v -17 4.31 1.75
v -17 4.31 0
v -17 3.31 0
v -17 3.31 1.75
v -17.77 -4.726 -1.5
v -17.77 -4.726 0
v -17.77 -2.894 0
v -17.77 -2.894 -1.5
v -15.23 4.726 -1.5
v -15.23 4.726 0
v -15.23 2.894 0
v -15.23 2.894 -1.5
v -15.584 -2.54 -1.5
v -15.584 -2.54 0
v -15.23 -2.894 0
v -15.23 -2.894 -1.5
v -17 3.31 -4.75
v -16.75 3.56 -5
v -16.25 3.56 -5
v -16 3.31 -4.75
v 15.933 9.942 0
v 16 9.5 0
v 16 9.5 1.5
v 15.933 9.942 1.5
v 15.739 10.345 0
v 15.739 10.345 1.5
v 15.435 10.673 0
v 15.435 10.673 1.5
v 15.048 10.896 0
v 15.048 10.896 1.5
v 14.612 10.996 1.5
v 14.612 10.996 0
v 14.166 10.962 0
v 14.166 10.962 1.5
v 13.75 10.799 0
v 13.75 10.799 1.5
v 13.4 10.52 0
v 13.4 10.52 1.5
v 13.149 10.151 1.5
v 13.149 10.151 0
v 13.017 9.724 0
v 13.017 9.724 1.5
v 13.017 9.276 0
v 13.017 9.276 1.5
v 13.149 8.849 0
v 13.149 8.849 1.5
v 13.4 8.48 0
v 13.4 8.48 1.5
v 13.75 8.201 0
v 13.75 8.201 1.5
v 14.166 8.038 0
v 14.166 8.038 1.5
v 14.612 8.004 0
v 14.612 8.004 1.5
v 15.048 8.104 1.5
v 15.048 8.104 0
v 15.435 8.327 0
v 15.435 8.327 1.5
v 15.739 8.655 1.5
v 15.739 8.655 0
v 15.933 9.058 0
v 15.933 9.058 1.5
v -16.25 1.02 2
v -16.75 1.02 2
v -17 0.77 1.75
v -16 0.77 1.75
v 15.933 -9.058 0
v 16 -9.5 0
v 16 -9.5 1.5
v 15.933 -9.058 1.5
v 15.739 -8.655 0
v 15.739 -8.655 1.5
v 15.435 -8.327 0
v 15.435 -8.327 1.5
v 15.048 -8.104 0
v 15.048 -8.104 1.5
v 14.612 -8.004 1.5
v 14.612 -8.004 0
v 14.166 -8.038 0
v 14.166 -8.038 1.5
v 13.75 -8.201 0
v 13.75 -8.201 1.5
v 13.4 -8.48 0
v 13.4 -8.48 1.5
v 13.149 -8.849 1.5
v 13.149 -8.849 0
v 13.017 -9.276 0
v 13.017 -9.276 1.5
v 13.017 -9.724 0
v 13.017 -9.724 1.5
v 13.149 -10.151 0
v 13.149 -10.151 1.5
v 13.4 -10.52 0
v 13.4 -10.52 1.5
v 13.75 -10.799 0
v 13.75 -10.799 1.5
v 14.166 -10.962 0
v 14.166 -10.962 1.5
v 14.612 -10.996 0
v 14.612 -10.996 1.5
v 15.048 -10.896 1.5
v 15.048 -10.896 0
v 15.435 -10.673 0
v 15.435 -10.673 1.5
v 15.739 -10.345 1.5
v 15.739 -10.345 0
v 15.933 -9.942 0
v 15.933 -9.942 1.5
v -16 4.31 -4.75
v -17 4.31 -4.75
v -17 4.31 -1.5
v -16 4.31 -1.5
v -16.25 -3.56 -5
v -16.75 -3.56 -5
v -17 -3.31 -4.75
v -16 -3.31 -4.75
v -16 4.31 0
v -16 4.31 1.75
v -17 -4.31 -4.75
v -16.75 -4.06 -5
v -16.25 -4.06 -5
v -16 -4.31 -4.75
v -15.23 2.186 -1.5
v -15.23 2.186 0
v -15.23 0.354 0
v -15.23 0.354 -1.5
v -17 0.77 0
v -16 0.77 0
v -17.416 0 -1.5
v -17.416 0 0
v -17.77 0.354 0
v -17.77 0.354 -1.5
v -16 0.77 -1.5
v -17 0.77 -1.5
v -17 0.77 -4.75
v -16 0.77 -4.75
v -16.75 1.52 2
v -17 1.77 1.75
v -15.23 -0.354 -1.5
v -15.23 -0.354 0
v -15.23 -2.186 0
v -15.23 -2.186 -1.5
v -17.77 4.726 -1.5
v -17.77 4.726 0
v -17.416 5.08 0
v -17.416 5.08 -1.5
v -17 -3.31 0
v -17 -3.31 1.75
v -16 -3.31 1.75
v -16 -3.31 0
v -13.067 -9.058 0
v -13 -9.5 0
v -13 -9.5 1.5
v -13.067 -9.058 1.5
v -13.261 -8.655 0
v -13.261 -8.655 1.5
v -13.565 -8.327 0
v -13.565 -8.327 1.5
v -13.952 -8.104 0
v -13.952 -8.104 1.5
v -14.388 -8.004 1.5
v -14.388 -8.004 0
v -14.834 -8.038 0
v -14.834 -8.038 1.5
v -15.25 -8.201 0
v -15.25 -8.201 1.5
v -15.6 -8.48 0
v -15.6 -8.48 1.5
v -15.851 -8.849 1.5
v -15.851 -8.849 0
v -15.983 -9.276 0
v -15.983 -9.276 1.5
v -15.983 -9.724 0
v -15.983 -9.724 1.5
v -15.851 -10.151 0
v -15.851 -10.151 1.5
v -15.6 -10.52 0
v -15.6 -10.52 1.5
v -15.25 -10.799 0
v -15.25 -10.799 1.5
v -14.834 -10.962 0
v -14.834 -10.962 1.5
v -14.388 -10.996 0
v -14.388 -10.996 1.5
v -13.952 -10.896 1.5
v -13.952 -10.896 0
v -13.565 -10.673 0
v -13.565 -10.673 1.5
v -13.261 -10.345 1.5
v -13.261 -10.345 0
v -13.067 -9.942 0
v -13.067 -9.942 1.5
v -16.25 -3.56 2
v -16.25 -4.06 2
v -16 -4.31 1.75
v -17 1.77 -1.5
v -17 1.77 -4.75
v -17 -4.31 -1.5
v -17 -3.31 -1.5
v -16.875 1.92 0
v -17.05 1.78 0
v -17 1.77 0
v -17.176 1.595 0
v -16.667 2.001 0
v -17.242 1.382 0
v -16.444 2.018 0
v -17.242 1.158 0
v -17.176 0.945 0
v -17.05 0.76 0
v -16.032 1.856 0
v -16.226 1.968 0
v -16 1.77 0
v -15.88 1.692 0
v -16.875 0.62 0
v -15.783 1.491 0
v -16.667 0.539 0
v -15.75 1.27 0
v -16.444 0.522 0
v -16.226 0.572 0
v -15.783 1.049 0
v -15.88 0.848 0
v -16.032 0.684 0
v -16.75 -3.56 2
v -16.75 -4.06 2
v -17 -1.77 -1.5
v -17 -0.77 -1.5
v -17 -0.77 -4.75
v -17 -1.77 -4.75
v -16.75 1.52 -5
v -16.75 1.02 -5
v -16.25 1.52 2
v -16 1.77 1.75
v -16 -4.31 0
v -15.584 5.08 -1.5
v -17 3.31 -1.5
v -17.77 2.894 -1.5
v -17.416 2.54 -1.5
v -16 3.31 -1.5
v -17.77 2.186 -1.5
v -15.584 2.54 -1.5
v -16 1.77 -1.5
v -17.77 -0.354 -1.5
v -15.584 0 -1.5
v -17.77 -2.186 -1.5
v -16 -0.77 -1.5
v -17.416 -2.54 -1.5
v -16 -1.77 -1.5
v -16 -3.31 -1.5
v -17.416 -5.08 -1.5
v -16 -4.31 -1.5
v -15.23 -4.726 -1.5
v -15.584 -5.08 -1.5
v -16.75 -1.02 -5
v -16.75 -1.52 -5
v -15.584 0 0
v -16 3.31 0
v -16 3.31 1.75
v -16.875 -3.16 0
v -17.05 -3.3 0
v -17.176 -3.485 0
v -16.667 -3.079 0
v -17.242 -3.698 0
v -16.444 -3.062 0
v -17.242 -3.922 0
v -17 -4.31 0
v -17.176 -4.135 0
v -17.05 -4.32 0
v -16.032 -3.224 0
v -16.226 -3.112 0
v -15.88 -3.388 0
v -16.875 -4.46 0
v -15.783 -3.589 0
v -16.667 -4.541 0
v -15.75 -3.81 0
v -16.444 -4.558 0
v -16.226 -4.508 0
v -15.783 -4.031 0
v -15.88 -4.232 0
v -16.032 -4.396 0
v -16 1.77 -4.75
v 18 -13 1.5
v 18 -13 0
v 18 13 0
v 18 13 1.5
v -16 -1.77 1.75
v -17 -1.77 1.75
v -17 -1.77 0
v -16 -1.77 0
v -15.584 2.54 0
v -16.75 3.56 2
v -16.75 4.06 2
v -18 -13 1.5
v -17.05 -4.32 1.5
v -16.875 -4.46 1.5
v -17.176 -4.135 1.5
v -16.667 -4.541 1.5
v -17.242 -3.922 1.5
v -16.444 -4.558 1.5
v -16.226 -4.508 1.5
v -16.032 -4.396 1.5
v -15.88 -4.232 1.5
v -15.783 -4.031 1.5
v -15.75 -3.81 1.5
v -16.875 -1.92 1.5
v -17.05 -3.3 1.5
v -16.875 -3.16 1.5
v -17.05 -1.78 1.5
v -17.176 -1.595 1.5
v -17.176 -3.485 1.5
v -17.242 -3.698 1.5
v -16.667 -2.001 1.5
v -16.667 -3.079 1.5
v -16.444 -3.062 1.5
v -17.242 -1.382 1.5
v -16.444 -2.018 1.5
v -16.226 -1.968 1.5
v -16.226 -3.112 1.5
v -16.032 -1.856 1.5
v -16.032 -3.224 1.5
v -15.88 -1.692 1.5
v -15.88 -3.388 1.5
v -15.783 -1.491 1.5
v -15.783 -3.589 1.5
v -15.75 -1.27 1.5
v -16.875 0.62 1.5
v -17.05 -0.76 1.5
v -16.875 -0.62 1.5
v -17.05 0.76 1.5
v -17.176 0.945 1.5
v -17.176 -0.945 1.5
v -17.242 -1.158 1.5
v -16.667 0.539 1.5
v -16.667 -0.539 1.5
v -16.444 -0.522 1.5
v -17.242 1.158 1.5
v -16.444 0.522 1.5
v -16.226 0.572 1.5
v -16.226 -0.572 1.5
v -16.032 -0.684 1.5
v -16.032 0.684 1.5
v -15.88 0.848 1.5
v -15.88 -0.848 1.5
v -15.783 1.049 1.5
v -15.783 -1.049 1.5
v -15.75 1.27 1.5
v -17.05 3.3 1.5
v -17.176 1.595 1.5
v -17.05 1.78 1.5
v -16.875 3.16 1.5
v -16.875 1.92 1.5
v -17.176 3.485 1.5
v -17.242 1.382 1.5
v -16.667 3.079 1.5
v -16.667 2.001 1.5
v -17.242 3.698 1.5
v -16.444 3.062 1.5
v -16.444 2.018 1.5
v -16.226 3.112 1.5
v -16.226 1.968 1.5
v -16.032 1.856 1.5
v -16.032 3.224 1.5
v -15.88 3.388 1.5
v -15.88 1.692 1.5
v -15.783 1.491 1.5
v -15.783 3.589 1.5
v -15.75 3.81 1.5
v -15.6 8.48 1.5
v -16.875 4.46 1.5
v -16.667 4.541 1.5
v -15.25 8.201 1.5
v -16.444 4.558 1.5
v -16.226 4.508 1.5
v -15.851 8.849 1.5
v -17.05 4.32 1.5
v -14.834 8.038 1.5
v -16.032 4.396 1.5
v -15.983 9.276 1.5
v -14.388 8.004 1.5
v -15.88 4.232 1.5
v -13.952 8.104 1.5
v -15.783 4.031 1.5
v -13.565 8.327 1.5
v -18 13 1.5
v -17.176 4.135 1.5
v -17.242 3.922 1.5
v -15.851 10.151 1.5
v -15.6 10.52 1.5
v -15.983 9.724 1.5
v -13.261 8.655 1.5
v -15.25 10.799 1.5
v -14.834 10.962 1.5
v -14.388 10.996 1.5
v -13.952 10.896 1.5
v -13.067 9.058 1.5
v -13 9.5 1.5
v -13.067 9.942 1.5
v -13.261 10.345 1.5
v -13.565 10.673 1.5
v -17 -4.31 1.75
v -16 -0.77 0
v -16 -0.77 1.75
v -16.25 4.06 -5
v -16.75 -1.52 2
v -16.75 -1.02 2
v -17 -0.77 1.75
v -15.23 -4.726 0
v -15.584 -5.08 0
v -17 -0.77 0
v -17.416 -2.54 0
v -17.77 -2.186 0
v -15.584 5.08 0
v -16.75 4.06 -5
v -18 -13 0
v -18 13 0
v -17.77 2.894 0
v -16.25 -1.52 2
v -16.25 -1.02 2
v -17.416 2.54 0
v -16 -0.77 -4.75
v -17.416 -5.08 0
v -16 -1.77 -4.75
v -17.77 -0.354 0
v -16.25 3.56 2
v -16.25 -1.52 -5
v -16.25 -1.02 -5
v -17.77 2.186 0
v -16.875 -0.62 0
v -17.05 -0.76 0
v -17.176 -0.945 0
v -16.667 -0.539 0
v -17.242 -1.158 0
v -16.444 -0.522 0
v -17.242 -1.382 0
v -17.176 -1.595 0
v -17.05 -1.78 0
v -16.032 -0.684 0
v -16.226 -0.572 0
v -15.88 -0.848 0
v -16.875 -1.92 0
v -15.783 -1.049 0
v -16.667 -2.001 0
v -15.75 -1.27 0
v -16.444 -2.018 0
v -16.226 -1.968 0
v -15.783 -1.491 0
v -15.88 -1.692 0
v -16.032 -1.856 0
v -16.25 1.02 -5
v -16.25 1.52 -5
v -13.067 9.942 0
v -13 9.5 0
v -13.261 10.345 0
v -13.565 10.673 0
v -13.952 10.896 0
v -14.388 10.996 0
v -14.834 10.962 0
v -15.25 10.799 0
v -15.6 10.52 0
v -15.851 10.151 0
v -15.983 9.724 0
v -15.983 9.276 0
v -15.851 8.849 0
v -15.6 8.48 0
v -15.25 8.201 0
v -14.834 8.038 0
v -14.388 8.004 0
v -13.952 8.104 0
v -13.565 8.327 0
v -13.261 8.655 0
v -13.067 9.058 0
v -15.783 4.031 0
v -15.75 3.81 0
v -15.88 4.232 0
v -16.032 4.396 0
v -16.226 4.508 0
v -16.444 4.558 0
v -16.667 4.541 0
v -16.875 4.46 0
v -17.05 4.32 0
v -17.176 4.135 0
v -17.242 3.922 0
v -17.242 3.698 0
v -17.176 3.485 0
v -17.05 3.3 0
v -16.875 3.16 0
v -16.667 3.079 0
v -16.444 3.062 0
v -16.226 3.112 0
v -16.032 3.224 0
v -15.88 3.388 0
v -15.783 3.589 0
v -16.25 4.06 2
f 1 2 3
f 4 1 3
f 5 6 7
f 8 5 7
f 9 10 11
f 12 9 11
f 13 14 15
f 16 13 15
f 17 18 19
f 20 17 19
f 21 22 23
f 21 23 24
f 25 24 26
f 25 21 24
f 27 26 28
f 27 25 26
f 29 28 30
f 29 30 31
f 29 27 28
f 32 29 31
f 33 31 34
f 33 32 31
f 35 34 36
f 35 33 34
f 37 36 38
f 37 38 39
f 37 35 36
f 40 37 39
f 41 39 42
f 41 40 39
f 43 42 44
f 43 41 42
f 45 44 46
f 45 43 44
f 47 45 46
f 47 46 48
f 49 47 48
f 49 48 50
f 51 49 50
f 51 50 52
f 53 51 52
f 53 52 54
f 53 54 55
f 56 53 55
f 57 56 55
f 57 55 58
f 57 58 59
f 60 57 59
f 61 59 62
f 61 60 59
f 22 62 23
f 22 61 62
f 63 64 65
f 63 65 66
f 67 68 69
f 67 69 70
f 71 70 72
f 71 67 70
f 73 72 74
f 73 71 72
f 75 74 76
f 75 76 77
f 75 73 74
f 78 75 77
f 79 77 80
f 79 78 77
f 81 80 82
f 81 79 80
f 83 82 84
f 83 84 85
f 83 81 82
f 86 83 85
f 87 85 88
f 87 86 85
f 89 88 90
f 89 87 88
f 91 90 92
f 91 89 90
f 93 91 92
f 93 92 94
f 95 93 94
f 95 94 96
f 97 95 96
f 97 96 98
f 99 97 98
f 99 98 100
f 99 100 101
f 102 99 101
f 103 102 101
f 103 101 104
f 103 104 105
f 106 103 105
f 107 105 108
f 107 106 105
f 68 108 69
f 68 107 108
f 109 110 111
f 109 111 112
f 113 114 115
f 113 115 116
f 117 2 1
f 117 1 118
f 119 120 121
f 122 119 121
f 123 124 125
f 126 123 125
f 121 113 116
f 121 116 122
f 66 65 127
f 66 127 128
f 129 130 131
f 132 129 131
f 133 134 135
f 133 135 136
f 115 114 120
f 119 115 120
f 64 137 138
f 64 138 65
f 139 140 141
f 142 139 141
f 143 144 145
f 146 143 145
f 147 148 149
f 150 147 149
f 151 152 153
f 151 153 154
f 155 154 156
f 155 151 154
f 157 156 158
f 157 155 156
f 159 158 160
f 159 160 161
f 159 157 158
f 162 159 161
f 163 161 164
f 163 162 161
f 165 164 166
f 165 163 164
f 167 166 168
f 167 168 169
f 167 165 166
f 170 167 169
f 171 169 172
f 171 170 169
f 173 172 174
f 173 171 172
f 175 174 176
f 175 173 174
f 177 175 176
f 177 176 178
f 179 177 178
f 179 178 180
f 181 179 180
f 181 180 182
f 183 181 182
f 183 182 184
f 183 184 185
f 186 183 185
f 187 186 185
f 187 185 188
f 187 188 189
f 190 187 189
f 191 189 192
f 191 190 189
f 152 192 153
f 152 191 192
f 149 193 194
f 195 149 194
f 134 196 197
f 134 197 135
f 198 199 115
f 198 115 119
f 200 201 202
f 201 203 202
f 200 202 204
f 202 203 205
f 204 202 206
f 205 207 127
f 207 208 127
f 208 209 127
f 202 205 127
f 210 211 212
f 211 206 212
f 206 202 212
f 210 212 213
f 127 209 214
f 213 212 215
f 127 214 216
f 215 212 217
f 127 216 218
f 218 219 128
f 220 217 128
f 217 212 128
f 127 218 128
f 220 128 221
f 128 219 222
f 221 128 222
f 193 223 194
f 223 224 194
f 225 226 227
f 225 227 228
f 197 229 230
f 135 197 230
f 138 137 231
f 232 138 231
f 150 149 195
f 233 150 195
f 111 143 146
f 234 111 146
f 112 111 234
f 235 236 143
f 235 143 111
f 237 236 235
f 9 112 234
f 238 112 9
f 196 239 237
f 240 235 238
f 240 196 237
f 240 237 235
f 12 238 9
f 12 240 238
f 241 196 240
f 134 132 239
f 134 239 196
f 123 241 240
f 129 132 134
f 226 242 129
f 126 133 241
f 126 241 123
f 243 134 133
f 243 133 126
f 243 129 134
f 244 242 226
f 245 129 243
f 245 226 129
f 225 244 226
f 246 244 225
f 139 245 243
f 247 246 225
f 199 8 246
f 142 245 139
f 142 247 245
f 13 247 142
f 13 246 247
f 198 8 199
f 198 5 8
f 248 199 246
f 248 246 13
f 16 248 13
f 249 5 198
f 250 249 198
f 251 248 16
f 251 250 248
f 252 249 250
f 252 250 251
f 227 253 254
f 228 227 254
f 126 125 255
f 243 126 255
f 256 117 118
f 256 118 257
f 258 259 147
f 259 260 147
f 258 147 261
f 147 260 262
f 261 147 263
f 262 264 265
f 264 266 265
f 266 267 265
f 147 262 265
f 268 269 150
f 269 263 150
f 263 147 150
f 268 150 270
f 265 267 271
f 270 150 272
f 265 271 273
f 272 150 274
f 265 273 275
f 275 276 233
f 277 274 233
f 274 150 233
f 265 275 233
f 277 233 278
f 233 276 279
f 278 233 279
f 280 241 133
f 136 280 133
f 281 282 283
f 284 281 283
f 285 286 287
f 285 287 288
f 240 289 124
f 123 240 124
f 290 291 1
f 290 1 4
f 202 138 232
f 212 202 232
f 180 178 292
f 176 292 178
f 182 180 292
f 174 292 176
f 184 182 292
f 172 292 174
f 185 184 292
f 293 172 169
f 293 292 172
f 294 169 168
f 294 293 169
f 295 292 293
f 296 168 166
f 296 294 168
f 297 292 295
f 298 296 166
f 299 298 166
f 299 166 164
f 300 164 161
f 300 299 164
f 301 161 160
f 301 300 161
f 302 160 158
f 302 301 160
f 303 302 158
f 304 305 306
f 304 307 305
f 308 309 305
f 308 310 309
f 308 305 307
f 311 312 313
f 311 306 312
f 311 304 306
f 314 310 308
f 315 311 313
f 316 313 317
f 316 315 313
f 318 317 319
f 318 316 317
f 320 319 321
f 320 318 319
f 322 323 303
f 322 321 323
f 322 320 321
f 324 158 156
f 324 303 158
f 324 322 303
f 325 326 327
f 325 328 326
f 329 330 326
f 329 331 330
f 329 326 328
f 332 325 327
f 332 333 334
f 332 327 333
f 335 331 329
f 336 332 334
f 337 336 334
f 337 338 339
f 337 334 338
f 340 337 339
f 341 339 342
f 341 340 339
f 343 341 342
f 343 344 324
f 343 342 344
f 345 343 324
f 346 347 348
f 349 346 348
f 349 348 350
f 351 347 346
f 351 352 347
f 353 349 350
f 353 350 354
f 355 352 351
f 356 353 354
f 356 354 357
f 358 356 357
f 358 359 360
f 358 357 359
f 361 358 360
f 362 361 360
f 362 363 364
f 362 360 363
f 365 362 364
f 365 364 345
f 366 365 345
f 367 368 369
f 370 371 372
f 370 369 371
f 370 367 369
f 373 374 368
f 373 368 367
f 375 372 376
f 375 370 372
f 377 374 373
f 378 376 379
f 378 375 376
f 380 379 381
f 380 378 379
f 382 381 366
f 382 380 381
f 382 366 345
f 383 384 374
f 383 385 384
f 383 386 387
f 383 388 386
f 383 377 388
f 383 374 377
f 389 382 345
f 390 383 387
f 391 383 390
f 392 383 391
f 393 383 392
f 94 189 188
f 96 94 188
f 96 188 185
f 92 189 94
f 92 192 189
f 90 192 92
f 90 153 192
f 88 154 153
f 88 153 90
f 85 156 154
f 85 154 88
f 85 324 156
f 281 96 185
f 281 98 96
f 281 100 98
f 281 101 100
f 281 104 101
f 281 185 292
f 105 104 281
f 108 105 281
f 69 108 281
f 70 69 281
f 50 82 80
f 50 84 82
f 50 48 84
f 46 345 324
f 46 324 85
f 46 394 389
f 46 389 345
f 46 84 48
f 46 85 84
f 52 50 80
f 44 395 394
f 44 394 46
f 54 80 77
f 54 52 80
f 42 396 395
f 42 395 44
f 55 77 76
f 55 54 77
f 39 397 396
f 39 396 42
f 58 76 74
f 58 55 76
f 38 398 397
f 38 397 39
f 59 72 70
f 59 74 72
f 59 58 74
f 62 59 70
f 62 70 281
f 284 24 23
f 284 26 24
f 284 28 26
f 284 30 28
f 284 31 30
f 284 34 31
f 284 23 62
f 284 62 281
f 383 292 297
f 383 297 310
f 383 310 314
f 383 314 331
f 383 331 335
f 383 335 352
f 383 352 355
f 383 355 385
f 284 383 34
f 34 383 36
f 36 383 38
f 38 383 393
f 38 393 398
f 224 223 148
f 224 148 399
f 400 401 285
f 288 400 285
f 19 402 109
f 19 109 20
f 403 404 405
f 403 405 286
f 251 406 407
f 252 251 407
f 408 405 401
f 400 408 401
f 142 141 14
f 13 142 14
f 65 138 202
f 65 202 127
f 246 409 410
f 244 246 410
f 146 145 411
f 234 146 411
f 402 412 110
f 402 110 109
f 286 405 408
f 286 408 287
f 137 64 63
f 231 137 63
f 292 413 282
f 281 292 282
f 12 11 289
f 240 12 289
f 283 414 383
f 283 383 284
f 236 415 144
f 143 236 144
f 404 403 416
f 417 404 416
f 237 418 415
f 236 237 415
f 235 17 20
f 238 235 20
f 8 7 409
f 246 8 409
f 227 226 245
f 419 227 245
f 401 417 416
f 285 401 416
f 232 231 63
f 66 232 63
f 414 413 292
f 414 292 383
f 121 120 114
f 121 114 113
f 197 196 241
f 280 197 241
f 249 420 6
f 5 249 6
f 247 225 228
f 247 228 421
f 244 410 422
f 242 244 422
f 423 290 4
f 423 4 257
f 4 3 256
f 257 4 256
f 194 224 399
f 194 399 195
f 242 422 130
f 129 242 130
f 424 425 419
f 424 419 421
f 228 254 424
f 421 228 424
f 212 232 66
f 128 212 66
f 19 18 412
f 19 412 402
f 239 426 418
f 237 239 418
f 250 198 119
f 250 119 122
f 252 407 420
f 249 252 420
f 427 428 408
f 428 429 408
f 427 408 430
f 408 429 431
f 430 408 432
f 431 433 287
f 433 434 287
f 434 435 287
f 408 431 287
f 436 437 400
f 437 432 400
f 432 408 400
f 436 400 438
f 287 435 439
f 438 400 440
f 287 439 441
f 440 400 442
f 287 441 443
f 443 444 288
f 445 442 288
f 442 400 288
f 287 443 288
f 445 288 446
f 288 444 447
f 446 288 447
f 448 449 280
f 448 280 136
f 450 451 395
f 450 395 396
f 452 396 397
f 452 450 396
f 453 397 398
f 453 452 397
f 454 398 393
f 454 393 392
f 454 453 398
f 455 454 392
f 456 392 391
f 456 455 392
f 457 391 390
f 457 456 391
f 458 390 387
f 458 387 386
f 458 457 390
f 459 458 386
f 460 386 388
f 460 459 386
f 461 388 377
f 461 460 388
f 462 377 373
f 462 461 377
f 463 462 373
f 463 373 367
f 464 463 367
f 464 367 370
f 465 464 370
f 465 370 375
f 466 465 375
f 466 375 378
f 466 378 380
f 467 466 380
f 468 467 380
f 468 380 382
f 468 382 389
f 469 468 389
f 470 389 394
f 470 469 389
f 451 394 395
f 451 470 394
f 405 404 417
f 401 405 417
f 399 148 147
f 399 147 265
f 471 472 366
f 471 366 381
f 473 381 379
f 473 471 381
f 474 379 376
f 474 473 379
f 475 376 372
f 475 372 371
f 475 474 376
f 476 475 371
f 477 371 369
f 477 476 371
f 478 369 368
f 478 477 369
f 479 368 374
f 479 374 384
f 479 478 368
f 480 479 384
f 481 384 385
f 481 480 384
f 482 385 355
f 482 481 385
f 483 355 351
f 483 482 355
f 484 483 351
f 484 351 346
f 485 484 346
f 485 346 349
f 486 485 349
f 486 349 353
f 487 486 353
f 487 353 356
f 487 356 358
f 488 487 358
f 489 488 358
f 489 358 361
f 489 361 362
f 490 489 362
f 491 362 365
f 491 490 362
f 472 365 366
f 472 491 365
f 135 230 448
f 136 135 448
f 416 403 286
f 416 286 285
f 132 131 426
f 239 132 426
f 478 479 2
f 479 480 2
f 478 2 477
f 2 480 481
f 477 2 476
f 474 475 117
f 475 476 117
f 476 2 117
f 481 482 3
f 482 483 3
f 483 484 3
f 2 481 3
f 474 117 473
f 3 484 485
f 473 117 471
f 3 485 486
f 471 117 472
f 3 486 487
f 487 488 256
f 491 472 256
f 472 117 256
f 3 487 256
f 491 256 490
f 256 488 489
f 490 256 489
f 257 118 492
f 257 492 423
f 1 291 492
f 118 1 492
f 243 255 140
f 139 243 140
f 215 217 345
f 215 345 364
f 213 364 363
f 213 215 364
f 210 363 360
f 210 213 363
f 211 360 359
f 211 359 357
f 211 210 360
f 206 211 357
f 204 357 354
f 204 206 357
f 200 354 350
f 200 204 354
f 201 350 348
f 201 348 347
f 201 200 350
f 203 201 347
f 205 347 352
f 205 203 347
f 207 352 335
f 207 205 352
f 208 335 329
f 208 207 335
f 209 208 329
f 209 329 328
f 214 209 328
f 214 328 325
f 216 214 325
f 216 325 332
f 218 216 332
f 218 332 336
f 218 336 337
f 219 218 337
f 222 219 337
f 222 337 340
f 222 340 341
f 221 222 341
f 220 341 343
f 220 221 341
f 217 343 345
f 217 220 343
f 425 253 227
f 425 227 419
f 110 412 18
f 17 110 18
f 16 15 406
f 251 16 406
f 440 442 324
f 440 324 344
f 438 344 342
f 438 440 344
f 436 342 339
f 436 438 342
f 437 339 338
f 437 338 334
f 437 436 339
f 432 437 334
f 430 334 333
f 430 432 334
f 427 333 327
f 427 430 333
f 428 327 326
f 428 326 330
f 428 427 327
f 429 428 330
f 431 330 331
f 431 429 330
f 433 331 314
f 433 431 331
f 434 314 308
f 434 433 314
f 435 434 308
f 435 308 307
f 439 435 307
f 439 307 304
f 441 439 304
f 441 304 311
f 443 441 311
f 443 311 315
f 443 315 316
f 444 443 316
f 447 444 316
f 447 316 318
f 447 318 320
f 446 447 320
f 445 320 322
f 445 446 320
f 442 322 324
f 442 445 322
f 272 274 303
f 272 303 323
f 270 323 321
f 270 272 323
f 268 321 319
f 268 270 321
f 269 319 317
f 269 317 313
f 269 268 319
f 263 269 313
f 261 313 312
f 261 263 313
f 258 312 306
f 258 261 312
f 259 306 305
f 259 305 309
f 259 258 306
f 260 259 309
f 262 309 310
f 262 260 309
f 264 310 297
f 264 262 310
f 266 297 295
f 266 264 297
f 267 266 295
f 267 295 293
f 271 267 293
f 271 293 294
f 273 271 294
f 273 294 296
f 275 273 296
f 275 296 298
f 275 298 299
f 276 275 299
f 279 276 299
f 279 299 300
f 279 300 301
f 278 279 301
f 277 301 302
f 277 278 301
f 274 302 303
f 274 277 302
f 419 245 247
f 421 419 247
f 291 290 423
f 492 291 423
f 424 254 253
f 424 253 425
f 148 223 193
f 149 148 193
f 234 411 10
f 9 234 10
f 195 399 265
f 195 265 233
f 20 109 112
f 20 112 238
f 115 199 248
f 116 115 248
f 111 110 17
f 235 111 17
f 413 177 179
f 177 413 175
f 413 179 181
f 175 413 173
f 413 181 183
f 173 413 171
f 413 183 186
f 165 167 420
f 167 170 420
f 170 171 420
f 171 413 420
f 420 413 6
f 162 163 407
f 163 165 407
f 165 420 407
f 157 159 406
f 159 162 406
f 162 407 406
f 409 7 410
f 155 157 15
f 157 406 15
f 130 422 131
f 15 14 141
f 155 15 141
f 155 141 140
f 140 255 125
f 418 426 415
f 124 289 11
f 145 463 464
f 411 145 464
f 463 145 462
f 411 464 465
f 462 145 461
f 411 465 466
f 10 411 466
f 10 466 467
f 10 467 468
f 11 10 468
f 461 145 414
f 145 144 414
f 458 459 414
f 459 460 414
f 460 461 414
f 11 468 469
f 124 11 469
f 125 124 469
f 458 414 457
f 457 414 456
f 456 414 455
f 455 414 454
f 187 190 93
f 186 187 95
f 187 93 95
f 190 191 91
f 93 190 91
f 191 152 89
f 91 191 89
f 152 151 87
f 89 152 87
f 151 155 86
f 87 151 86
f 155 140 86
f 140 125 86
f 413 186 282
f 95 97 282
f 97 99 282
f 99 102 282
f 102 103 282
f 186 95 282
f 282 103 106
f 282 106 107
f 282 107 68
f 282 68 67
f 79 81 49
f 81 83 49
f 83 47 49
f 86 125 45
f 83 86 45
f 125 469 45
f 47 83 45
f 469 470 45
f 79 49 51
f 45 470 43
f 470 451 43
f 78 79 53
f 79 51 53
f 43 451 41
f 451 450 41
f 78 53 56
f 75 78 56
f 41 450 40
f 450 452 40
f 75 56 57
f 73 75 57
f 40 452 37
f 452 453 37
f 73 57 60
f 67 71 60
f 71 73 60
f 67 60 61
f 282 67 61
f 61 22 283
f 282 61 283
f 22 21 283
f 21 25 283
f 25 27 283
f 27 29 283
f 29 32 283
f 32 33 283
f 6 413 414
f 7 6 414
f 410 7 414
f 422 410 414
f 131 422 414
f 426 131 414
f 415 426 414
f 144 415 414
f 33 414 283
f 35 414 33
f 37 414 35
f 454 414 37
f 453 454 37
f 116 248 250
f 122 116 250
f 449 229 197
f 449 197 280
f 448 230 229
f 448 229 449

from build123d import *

# Parameters (mm, degrees)
SKETCH_W     = 36
SKETCH_H     = 26
SKETCH_R     = 1.5
SKETCH_R_2   = 0.75
PAD_DEPTH    = 1.5
PAD001_DEPTH = 1.5
SKETCH002_W  = 1
SKETCH002_H  = 1
PAD002_DEPTH = 3.5
CHAMFER_SIZE = 0.25


with BuildPart() as part:
    # Sketch → Pad (new body)
    with BuildSketch(Plane.XY):
        Rectangle(SKETCH_W, SKETCH_H)
        with Locations((-14.5, 9.5)):
            Circle(SKETCH_R, mode=Mode.SUBTRACT)
        with Locations((14.5, 9.5)):
            Circle(SKETCH_R, mode=Mode.SUBTRACT)
        with Locations((14.5, -9.5)):
            Circle(SKETCH_R, mode=Mode.SUBTRACT)
        with Locations((-14.5, -9.5)):
            Circle(SKETCH_R, mode=Mode.SUBTRACT)
        with Locations((-16.5, 3.81)):
            Circle(SKETCH_R_2, mode=Mode.SUBTRACT)
        with Locations((-16.5, 1.27)):
            Circle(SKETCH_R_2, mode=Mode.SUBTRACT)
        with Locations((-16.5, -1.27)):
            Circle(SKETCH_R_2, mode=Mode.SUBTRACT)
        with Locations((-16.5, -3.81)):
            Circle(SKETCH_R_2, mode=Mode.SUBTRACT)
    extrude(amount=PAD_DEPTH)

    # Sketch001 (on Face13 of Pad) → Pad001 (join)
    with BuildSketch(Plane(origin=(0, 0, 0), x_dir=(1, 0, 0), z_dir=(0, 0, -1))):
        Polygon((-17.77, 4.726447), (-17.77, 2.893553), (-17.416447, 2.54), (-15.583553, 2.54), (-15.23, 2.893553), (-15.23, 4.726447), (-15.583553, 5.08), (-17.416447, 5.08), align=None)
        Polygon((-17.77, 2.186447), (-17.77, 0.353553), (-17.416447, 0), (-15.583553, 0), (-15.23, 0.353553), (-15.23, 2.186447), (-15.583553, 2.54), (-17.416447, 2.54), align=None)
        Polygon((-17.77, -0.353553), (-17.77, -2.186447), (-17.416447, -2.54), (-15.583553, -2.54), (-15.23, -2.186447), (-15.23, -0.353553), (-15.583553, 0), (-17.416447, 0), align=None)
        Polygon((-17.77, -2.893553), (-17.77, -4.726447), (-17.416447, -5.08), (-15.583553, -5.08), (-15.23, -4.726447), (-15.23, -2.893553), (-15.583553, -2.54), (-17.416447, -2.54), align=None)
    extrude(amount=PAD001_DEPTH)

    # Sketch002 (on Face41 of Pad001) → Pad002 (join, symmetric)
    with BuildSketch(Plane(origin=(0, 0, -1.5), x_dir=(1, 0, 0), z_dir=(0, 0, -1))):
        with Locations((-16.5, 3.81)):
            Rectangle(SKETCH002_W, SKETCH002_H)
        with Locations((-16.5, 1.27)):
            Rectangle(SKETCH002_W, SKETCH002_H)
        with Locations((-16.5, -1.27)):
            Rectangle(SKETCH002_W, SKETCH002_H)
        with Locations((-16.5, -3.81)):
            Rectangle(SKETCH002_W, SKETCH002_H)
    extrude(amount=PAD002_DEPTH, both=True)

    # Chamfer
    chamfer_edges = [part.edges().sort_by_distance(p)[0] for p in [
        (-16, 1.27, 2),
        (-16, 3.81, 2),
        (-16.5, 4.31, 2),
        (-17, 3.81, 2),
        (-16.5, 3.31, 2),
        (-16.5, 1.77, 2),
        (-17, 1.27, 2),
        (-16.5, 0.77, 2),
        (-17, -1.27, 2),
        (-16.5, -0.77, 2),
        (-16, -1.27, 2),
        (-16.5, -1.77, 2),
        (-16.5, -3.31, 2),
        (-17, -3.81, 2),
        (-16.5, -4.31, 2),
        (-16, -3.81, 2),
        (-16, -1.27, -5),
        (-16, -3.81, -5),
        (-16.5, -4.31, -5),
        (-17, -3.81, -5),
        (-16.5, -3.31, -5),
        (-16.5, -1.77, -5),
        (-17, -1.27, -5),
        (-16.5, -0.77, -5),
        (-16.5, 0.77, -5),
        (-16, 1.27, -5),
        (-16.5, 1.77, -5),
        (-17, 1.27, -5),
        (-16.5, 3.31, -5),
        (-16, 3.81, -5),
        (-16.5, 4.31, -5),
        (-17, 3.81, -5),
    ]]
    chamfer(chamfer_edges, length=CHAMFER_SIZE)


solid = part.part
